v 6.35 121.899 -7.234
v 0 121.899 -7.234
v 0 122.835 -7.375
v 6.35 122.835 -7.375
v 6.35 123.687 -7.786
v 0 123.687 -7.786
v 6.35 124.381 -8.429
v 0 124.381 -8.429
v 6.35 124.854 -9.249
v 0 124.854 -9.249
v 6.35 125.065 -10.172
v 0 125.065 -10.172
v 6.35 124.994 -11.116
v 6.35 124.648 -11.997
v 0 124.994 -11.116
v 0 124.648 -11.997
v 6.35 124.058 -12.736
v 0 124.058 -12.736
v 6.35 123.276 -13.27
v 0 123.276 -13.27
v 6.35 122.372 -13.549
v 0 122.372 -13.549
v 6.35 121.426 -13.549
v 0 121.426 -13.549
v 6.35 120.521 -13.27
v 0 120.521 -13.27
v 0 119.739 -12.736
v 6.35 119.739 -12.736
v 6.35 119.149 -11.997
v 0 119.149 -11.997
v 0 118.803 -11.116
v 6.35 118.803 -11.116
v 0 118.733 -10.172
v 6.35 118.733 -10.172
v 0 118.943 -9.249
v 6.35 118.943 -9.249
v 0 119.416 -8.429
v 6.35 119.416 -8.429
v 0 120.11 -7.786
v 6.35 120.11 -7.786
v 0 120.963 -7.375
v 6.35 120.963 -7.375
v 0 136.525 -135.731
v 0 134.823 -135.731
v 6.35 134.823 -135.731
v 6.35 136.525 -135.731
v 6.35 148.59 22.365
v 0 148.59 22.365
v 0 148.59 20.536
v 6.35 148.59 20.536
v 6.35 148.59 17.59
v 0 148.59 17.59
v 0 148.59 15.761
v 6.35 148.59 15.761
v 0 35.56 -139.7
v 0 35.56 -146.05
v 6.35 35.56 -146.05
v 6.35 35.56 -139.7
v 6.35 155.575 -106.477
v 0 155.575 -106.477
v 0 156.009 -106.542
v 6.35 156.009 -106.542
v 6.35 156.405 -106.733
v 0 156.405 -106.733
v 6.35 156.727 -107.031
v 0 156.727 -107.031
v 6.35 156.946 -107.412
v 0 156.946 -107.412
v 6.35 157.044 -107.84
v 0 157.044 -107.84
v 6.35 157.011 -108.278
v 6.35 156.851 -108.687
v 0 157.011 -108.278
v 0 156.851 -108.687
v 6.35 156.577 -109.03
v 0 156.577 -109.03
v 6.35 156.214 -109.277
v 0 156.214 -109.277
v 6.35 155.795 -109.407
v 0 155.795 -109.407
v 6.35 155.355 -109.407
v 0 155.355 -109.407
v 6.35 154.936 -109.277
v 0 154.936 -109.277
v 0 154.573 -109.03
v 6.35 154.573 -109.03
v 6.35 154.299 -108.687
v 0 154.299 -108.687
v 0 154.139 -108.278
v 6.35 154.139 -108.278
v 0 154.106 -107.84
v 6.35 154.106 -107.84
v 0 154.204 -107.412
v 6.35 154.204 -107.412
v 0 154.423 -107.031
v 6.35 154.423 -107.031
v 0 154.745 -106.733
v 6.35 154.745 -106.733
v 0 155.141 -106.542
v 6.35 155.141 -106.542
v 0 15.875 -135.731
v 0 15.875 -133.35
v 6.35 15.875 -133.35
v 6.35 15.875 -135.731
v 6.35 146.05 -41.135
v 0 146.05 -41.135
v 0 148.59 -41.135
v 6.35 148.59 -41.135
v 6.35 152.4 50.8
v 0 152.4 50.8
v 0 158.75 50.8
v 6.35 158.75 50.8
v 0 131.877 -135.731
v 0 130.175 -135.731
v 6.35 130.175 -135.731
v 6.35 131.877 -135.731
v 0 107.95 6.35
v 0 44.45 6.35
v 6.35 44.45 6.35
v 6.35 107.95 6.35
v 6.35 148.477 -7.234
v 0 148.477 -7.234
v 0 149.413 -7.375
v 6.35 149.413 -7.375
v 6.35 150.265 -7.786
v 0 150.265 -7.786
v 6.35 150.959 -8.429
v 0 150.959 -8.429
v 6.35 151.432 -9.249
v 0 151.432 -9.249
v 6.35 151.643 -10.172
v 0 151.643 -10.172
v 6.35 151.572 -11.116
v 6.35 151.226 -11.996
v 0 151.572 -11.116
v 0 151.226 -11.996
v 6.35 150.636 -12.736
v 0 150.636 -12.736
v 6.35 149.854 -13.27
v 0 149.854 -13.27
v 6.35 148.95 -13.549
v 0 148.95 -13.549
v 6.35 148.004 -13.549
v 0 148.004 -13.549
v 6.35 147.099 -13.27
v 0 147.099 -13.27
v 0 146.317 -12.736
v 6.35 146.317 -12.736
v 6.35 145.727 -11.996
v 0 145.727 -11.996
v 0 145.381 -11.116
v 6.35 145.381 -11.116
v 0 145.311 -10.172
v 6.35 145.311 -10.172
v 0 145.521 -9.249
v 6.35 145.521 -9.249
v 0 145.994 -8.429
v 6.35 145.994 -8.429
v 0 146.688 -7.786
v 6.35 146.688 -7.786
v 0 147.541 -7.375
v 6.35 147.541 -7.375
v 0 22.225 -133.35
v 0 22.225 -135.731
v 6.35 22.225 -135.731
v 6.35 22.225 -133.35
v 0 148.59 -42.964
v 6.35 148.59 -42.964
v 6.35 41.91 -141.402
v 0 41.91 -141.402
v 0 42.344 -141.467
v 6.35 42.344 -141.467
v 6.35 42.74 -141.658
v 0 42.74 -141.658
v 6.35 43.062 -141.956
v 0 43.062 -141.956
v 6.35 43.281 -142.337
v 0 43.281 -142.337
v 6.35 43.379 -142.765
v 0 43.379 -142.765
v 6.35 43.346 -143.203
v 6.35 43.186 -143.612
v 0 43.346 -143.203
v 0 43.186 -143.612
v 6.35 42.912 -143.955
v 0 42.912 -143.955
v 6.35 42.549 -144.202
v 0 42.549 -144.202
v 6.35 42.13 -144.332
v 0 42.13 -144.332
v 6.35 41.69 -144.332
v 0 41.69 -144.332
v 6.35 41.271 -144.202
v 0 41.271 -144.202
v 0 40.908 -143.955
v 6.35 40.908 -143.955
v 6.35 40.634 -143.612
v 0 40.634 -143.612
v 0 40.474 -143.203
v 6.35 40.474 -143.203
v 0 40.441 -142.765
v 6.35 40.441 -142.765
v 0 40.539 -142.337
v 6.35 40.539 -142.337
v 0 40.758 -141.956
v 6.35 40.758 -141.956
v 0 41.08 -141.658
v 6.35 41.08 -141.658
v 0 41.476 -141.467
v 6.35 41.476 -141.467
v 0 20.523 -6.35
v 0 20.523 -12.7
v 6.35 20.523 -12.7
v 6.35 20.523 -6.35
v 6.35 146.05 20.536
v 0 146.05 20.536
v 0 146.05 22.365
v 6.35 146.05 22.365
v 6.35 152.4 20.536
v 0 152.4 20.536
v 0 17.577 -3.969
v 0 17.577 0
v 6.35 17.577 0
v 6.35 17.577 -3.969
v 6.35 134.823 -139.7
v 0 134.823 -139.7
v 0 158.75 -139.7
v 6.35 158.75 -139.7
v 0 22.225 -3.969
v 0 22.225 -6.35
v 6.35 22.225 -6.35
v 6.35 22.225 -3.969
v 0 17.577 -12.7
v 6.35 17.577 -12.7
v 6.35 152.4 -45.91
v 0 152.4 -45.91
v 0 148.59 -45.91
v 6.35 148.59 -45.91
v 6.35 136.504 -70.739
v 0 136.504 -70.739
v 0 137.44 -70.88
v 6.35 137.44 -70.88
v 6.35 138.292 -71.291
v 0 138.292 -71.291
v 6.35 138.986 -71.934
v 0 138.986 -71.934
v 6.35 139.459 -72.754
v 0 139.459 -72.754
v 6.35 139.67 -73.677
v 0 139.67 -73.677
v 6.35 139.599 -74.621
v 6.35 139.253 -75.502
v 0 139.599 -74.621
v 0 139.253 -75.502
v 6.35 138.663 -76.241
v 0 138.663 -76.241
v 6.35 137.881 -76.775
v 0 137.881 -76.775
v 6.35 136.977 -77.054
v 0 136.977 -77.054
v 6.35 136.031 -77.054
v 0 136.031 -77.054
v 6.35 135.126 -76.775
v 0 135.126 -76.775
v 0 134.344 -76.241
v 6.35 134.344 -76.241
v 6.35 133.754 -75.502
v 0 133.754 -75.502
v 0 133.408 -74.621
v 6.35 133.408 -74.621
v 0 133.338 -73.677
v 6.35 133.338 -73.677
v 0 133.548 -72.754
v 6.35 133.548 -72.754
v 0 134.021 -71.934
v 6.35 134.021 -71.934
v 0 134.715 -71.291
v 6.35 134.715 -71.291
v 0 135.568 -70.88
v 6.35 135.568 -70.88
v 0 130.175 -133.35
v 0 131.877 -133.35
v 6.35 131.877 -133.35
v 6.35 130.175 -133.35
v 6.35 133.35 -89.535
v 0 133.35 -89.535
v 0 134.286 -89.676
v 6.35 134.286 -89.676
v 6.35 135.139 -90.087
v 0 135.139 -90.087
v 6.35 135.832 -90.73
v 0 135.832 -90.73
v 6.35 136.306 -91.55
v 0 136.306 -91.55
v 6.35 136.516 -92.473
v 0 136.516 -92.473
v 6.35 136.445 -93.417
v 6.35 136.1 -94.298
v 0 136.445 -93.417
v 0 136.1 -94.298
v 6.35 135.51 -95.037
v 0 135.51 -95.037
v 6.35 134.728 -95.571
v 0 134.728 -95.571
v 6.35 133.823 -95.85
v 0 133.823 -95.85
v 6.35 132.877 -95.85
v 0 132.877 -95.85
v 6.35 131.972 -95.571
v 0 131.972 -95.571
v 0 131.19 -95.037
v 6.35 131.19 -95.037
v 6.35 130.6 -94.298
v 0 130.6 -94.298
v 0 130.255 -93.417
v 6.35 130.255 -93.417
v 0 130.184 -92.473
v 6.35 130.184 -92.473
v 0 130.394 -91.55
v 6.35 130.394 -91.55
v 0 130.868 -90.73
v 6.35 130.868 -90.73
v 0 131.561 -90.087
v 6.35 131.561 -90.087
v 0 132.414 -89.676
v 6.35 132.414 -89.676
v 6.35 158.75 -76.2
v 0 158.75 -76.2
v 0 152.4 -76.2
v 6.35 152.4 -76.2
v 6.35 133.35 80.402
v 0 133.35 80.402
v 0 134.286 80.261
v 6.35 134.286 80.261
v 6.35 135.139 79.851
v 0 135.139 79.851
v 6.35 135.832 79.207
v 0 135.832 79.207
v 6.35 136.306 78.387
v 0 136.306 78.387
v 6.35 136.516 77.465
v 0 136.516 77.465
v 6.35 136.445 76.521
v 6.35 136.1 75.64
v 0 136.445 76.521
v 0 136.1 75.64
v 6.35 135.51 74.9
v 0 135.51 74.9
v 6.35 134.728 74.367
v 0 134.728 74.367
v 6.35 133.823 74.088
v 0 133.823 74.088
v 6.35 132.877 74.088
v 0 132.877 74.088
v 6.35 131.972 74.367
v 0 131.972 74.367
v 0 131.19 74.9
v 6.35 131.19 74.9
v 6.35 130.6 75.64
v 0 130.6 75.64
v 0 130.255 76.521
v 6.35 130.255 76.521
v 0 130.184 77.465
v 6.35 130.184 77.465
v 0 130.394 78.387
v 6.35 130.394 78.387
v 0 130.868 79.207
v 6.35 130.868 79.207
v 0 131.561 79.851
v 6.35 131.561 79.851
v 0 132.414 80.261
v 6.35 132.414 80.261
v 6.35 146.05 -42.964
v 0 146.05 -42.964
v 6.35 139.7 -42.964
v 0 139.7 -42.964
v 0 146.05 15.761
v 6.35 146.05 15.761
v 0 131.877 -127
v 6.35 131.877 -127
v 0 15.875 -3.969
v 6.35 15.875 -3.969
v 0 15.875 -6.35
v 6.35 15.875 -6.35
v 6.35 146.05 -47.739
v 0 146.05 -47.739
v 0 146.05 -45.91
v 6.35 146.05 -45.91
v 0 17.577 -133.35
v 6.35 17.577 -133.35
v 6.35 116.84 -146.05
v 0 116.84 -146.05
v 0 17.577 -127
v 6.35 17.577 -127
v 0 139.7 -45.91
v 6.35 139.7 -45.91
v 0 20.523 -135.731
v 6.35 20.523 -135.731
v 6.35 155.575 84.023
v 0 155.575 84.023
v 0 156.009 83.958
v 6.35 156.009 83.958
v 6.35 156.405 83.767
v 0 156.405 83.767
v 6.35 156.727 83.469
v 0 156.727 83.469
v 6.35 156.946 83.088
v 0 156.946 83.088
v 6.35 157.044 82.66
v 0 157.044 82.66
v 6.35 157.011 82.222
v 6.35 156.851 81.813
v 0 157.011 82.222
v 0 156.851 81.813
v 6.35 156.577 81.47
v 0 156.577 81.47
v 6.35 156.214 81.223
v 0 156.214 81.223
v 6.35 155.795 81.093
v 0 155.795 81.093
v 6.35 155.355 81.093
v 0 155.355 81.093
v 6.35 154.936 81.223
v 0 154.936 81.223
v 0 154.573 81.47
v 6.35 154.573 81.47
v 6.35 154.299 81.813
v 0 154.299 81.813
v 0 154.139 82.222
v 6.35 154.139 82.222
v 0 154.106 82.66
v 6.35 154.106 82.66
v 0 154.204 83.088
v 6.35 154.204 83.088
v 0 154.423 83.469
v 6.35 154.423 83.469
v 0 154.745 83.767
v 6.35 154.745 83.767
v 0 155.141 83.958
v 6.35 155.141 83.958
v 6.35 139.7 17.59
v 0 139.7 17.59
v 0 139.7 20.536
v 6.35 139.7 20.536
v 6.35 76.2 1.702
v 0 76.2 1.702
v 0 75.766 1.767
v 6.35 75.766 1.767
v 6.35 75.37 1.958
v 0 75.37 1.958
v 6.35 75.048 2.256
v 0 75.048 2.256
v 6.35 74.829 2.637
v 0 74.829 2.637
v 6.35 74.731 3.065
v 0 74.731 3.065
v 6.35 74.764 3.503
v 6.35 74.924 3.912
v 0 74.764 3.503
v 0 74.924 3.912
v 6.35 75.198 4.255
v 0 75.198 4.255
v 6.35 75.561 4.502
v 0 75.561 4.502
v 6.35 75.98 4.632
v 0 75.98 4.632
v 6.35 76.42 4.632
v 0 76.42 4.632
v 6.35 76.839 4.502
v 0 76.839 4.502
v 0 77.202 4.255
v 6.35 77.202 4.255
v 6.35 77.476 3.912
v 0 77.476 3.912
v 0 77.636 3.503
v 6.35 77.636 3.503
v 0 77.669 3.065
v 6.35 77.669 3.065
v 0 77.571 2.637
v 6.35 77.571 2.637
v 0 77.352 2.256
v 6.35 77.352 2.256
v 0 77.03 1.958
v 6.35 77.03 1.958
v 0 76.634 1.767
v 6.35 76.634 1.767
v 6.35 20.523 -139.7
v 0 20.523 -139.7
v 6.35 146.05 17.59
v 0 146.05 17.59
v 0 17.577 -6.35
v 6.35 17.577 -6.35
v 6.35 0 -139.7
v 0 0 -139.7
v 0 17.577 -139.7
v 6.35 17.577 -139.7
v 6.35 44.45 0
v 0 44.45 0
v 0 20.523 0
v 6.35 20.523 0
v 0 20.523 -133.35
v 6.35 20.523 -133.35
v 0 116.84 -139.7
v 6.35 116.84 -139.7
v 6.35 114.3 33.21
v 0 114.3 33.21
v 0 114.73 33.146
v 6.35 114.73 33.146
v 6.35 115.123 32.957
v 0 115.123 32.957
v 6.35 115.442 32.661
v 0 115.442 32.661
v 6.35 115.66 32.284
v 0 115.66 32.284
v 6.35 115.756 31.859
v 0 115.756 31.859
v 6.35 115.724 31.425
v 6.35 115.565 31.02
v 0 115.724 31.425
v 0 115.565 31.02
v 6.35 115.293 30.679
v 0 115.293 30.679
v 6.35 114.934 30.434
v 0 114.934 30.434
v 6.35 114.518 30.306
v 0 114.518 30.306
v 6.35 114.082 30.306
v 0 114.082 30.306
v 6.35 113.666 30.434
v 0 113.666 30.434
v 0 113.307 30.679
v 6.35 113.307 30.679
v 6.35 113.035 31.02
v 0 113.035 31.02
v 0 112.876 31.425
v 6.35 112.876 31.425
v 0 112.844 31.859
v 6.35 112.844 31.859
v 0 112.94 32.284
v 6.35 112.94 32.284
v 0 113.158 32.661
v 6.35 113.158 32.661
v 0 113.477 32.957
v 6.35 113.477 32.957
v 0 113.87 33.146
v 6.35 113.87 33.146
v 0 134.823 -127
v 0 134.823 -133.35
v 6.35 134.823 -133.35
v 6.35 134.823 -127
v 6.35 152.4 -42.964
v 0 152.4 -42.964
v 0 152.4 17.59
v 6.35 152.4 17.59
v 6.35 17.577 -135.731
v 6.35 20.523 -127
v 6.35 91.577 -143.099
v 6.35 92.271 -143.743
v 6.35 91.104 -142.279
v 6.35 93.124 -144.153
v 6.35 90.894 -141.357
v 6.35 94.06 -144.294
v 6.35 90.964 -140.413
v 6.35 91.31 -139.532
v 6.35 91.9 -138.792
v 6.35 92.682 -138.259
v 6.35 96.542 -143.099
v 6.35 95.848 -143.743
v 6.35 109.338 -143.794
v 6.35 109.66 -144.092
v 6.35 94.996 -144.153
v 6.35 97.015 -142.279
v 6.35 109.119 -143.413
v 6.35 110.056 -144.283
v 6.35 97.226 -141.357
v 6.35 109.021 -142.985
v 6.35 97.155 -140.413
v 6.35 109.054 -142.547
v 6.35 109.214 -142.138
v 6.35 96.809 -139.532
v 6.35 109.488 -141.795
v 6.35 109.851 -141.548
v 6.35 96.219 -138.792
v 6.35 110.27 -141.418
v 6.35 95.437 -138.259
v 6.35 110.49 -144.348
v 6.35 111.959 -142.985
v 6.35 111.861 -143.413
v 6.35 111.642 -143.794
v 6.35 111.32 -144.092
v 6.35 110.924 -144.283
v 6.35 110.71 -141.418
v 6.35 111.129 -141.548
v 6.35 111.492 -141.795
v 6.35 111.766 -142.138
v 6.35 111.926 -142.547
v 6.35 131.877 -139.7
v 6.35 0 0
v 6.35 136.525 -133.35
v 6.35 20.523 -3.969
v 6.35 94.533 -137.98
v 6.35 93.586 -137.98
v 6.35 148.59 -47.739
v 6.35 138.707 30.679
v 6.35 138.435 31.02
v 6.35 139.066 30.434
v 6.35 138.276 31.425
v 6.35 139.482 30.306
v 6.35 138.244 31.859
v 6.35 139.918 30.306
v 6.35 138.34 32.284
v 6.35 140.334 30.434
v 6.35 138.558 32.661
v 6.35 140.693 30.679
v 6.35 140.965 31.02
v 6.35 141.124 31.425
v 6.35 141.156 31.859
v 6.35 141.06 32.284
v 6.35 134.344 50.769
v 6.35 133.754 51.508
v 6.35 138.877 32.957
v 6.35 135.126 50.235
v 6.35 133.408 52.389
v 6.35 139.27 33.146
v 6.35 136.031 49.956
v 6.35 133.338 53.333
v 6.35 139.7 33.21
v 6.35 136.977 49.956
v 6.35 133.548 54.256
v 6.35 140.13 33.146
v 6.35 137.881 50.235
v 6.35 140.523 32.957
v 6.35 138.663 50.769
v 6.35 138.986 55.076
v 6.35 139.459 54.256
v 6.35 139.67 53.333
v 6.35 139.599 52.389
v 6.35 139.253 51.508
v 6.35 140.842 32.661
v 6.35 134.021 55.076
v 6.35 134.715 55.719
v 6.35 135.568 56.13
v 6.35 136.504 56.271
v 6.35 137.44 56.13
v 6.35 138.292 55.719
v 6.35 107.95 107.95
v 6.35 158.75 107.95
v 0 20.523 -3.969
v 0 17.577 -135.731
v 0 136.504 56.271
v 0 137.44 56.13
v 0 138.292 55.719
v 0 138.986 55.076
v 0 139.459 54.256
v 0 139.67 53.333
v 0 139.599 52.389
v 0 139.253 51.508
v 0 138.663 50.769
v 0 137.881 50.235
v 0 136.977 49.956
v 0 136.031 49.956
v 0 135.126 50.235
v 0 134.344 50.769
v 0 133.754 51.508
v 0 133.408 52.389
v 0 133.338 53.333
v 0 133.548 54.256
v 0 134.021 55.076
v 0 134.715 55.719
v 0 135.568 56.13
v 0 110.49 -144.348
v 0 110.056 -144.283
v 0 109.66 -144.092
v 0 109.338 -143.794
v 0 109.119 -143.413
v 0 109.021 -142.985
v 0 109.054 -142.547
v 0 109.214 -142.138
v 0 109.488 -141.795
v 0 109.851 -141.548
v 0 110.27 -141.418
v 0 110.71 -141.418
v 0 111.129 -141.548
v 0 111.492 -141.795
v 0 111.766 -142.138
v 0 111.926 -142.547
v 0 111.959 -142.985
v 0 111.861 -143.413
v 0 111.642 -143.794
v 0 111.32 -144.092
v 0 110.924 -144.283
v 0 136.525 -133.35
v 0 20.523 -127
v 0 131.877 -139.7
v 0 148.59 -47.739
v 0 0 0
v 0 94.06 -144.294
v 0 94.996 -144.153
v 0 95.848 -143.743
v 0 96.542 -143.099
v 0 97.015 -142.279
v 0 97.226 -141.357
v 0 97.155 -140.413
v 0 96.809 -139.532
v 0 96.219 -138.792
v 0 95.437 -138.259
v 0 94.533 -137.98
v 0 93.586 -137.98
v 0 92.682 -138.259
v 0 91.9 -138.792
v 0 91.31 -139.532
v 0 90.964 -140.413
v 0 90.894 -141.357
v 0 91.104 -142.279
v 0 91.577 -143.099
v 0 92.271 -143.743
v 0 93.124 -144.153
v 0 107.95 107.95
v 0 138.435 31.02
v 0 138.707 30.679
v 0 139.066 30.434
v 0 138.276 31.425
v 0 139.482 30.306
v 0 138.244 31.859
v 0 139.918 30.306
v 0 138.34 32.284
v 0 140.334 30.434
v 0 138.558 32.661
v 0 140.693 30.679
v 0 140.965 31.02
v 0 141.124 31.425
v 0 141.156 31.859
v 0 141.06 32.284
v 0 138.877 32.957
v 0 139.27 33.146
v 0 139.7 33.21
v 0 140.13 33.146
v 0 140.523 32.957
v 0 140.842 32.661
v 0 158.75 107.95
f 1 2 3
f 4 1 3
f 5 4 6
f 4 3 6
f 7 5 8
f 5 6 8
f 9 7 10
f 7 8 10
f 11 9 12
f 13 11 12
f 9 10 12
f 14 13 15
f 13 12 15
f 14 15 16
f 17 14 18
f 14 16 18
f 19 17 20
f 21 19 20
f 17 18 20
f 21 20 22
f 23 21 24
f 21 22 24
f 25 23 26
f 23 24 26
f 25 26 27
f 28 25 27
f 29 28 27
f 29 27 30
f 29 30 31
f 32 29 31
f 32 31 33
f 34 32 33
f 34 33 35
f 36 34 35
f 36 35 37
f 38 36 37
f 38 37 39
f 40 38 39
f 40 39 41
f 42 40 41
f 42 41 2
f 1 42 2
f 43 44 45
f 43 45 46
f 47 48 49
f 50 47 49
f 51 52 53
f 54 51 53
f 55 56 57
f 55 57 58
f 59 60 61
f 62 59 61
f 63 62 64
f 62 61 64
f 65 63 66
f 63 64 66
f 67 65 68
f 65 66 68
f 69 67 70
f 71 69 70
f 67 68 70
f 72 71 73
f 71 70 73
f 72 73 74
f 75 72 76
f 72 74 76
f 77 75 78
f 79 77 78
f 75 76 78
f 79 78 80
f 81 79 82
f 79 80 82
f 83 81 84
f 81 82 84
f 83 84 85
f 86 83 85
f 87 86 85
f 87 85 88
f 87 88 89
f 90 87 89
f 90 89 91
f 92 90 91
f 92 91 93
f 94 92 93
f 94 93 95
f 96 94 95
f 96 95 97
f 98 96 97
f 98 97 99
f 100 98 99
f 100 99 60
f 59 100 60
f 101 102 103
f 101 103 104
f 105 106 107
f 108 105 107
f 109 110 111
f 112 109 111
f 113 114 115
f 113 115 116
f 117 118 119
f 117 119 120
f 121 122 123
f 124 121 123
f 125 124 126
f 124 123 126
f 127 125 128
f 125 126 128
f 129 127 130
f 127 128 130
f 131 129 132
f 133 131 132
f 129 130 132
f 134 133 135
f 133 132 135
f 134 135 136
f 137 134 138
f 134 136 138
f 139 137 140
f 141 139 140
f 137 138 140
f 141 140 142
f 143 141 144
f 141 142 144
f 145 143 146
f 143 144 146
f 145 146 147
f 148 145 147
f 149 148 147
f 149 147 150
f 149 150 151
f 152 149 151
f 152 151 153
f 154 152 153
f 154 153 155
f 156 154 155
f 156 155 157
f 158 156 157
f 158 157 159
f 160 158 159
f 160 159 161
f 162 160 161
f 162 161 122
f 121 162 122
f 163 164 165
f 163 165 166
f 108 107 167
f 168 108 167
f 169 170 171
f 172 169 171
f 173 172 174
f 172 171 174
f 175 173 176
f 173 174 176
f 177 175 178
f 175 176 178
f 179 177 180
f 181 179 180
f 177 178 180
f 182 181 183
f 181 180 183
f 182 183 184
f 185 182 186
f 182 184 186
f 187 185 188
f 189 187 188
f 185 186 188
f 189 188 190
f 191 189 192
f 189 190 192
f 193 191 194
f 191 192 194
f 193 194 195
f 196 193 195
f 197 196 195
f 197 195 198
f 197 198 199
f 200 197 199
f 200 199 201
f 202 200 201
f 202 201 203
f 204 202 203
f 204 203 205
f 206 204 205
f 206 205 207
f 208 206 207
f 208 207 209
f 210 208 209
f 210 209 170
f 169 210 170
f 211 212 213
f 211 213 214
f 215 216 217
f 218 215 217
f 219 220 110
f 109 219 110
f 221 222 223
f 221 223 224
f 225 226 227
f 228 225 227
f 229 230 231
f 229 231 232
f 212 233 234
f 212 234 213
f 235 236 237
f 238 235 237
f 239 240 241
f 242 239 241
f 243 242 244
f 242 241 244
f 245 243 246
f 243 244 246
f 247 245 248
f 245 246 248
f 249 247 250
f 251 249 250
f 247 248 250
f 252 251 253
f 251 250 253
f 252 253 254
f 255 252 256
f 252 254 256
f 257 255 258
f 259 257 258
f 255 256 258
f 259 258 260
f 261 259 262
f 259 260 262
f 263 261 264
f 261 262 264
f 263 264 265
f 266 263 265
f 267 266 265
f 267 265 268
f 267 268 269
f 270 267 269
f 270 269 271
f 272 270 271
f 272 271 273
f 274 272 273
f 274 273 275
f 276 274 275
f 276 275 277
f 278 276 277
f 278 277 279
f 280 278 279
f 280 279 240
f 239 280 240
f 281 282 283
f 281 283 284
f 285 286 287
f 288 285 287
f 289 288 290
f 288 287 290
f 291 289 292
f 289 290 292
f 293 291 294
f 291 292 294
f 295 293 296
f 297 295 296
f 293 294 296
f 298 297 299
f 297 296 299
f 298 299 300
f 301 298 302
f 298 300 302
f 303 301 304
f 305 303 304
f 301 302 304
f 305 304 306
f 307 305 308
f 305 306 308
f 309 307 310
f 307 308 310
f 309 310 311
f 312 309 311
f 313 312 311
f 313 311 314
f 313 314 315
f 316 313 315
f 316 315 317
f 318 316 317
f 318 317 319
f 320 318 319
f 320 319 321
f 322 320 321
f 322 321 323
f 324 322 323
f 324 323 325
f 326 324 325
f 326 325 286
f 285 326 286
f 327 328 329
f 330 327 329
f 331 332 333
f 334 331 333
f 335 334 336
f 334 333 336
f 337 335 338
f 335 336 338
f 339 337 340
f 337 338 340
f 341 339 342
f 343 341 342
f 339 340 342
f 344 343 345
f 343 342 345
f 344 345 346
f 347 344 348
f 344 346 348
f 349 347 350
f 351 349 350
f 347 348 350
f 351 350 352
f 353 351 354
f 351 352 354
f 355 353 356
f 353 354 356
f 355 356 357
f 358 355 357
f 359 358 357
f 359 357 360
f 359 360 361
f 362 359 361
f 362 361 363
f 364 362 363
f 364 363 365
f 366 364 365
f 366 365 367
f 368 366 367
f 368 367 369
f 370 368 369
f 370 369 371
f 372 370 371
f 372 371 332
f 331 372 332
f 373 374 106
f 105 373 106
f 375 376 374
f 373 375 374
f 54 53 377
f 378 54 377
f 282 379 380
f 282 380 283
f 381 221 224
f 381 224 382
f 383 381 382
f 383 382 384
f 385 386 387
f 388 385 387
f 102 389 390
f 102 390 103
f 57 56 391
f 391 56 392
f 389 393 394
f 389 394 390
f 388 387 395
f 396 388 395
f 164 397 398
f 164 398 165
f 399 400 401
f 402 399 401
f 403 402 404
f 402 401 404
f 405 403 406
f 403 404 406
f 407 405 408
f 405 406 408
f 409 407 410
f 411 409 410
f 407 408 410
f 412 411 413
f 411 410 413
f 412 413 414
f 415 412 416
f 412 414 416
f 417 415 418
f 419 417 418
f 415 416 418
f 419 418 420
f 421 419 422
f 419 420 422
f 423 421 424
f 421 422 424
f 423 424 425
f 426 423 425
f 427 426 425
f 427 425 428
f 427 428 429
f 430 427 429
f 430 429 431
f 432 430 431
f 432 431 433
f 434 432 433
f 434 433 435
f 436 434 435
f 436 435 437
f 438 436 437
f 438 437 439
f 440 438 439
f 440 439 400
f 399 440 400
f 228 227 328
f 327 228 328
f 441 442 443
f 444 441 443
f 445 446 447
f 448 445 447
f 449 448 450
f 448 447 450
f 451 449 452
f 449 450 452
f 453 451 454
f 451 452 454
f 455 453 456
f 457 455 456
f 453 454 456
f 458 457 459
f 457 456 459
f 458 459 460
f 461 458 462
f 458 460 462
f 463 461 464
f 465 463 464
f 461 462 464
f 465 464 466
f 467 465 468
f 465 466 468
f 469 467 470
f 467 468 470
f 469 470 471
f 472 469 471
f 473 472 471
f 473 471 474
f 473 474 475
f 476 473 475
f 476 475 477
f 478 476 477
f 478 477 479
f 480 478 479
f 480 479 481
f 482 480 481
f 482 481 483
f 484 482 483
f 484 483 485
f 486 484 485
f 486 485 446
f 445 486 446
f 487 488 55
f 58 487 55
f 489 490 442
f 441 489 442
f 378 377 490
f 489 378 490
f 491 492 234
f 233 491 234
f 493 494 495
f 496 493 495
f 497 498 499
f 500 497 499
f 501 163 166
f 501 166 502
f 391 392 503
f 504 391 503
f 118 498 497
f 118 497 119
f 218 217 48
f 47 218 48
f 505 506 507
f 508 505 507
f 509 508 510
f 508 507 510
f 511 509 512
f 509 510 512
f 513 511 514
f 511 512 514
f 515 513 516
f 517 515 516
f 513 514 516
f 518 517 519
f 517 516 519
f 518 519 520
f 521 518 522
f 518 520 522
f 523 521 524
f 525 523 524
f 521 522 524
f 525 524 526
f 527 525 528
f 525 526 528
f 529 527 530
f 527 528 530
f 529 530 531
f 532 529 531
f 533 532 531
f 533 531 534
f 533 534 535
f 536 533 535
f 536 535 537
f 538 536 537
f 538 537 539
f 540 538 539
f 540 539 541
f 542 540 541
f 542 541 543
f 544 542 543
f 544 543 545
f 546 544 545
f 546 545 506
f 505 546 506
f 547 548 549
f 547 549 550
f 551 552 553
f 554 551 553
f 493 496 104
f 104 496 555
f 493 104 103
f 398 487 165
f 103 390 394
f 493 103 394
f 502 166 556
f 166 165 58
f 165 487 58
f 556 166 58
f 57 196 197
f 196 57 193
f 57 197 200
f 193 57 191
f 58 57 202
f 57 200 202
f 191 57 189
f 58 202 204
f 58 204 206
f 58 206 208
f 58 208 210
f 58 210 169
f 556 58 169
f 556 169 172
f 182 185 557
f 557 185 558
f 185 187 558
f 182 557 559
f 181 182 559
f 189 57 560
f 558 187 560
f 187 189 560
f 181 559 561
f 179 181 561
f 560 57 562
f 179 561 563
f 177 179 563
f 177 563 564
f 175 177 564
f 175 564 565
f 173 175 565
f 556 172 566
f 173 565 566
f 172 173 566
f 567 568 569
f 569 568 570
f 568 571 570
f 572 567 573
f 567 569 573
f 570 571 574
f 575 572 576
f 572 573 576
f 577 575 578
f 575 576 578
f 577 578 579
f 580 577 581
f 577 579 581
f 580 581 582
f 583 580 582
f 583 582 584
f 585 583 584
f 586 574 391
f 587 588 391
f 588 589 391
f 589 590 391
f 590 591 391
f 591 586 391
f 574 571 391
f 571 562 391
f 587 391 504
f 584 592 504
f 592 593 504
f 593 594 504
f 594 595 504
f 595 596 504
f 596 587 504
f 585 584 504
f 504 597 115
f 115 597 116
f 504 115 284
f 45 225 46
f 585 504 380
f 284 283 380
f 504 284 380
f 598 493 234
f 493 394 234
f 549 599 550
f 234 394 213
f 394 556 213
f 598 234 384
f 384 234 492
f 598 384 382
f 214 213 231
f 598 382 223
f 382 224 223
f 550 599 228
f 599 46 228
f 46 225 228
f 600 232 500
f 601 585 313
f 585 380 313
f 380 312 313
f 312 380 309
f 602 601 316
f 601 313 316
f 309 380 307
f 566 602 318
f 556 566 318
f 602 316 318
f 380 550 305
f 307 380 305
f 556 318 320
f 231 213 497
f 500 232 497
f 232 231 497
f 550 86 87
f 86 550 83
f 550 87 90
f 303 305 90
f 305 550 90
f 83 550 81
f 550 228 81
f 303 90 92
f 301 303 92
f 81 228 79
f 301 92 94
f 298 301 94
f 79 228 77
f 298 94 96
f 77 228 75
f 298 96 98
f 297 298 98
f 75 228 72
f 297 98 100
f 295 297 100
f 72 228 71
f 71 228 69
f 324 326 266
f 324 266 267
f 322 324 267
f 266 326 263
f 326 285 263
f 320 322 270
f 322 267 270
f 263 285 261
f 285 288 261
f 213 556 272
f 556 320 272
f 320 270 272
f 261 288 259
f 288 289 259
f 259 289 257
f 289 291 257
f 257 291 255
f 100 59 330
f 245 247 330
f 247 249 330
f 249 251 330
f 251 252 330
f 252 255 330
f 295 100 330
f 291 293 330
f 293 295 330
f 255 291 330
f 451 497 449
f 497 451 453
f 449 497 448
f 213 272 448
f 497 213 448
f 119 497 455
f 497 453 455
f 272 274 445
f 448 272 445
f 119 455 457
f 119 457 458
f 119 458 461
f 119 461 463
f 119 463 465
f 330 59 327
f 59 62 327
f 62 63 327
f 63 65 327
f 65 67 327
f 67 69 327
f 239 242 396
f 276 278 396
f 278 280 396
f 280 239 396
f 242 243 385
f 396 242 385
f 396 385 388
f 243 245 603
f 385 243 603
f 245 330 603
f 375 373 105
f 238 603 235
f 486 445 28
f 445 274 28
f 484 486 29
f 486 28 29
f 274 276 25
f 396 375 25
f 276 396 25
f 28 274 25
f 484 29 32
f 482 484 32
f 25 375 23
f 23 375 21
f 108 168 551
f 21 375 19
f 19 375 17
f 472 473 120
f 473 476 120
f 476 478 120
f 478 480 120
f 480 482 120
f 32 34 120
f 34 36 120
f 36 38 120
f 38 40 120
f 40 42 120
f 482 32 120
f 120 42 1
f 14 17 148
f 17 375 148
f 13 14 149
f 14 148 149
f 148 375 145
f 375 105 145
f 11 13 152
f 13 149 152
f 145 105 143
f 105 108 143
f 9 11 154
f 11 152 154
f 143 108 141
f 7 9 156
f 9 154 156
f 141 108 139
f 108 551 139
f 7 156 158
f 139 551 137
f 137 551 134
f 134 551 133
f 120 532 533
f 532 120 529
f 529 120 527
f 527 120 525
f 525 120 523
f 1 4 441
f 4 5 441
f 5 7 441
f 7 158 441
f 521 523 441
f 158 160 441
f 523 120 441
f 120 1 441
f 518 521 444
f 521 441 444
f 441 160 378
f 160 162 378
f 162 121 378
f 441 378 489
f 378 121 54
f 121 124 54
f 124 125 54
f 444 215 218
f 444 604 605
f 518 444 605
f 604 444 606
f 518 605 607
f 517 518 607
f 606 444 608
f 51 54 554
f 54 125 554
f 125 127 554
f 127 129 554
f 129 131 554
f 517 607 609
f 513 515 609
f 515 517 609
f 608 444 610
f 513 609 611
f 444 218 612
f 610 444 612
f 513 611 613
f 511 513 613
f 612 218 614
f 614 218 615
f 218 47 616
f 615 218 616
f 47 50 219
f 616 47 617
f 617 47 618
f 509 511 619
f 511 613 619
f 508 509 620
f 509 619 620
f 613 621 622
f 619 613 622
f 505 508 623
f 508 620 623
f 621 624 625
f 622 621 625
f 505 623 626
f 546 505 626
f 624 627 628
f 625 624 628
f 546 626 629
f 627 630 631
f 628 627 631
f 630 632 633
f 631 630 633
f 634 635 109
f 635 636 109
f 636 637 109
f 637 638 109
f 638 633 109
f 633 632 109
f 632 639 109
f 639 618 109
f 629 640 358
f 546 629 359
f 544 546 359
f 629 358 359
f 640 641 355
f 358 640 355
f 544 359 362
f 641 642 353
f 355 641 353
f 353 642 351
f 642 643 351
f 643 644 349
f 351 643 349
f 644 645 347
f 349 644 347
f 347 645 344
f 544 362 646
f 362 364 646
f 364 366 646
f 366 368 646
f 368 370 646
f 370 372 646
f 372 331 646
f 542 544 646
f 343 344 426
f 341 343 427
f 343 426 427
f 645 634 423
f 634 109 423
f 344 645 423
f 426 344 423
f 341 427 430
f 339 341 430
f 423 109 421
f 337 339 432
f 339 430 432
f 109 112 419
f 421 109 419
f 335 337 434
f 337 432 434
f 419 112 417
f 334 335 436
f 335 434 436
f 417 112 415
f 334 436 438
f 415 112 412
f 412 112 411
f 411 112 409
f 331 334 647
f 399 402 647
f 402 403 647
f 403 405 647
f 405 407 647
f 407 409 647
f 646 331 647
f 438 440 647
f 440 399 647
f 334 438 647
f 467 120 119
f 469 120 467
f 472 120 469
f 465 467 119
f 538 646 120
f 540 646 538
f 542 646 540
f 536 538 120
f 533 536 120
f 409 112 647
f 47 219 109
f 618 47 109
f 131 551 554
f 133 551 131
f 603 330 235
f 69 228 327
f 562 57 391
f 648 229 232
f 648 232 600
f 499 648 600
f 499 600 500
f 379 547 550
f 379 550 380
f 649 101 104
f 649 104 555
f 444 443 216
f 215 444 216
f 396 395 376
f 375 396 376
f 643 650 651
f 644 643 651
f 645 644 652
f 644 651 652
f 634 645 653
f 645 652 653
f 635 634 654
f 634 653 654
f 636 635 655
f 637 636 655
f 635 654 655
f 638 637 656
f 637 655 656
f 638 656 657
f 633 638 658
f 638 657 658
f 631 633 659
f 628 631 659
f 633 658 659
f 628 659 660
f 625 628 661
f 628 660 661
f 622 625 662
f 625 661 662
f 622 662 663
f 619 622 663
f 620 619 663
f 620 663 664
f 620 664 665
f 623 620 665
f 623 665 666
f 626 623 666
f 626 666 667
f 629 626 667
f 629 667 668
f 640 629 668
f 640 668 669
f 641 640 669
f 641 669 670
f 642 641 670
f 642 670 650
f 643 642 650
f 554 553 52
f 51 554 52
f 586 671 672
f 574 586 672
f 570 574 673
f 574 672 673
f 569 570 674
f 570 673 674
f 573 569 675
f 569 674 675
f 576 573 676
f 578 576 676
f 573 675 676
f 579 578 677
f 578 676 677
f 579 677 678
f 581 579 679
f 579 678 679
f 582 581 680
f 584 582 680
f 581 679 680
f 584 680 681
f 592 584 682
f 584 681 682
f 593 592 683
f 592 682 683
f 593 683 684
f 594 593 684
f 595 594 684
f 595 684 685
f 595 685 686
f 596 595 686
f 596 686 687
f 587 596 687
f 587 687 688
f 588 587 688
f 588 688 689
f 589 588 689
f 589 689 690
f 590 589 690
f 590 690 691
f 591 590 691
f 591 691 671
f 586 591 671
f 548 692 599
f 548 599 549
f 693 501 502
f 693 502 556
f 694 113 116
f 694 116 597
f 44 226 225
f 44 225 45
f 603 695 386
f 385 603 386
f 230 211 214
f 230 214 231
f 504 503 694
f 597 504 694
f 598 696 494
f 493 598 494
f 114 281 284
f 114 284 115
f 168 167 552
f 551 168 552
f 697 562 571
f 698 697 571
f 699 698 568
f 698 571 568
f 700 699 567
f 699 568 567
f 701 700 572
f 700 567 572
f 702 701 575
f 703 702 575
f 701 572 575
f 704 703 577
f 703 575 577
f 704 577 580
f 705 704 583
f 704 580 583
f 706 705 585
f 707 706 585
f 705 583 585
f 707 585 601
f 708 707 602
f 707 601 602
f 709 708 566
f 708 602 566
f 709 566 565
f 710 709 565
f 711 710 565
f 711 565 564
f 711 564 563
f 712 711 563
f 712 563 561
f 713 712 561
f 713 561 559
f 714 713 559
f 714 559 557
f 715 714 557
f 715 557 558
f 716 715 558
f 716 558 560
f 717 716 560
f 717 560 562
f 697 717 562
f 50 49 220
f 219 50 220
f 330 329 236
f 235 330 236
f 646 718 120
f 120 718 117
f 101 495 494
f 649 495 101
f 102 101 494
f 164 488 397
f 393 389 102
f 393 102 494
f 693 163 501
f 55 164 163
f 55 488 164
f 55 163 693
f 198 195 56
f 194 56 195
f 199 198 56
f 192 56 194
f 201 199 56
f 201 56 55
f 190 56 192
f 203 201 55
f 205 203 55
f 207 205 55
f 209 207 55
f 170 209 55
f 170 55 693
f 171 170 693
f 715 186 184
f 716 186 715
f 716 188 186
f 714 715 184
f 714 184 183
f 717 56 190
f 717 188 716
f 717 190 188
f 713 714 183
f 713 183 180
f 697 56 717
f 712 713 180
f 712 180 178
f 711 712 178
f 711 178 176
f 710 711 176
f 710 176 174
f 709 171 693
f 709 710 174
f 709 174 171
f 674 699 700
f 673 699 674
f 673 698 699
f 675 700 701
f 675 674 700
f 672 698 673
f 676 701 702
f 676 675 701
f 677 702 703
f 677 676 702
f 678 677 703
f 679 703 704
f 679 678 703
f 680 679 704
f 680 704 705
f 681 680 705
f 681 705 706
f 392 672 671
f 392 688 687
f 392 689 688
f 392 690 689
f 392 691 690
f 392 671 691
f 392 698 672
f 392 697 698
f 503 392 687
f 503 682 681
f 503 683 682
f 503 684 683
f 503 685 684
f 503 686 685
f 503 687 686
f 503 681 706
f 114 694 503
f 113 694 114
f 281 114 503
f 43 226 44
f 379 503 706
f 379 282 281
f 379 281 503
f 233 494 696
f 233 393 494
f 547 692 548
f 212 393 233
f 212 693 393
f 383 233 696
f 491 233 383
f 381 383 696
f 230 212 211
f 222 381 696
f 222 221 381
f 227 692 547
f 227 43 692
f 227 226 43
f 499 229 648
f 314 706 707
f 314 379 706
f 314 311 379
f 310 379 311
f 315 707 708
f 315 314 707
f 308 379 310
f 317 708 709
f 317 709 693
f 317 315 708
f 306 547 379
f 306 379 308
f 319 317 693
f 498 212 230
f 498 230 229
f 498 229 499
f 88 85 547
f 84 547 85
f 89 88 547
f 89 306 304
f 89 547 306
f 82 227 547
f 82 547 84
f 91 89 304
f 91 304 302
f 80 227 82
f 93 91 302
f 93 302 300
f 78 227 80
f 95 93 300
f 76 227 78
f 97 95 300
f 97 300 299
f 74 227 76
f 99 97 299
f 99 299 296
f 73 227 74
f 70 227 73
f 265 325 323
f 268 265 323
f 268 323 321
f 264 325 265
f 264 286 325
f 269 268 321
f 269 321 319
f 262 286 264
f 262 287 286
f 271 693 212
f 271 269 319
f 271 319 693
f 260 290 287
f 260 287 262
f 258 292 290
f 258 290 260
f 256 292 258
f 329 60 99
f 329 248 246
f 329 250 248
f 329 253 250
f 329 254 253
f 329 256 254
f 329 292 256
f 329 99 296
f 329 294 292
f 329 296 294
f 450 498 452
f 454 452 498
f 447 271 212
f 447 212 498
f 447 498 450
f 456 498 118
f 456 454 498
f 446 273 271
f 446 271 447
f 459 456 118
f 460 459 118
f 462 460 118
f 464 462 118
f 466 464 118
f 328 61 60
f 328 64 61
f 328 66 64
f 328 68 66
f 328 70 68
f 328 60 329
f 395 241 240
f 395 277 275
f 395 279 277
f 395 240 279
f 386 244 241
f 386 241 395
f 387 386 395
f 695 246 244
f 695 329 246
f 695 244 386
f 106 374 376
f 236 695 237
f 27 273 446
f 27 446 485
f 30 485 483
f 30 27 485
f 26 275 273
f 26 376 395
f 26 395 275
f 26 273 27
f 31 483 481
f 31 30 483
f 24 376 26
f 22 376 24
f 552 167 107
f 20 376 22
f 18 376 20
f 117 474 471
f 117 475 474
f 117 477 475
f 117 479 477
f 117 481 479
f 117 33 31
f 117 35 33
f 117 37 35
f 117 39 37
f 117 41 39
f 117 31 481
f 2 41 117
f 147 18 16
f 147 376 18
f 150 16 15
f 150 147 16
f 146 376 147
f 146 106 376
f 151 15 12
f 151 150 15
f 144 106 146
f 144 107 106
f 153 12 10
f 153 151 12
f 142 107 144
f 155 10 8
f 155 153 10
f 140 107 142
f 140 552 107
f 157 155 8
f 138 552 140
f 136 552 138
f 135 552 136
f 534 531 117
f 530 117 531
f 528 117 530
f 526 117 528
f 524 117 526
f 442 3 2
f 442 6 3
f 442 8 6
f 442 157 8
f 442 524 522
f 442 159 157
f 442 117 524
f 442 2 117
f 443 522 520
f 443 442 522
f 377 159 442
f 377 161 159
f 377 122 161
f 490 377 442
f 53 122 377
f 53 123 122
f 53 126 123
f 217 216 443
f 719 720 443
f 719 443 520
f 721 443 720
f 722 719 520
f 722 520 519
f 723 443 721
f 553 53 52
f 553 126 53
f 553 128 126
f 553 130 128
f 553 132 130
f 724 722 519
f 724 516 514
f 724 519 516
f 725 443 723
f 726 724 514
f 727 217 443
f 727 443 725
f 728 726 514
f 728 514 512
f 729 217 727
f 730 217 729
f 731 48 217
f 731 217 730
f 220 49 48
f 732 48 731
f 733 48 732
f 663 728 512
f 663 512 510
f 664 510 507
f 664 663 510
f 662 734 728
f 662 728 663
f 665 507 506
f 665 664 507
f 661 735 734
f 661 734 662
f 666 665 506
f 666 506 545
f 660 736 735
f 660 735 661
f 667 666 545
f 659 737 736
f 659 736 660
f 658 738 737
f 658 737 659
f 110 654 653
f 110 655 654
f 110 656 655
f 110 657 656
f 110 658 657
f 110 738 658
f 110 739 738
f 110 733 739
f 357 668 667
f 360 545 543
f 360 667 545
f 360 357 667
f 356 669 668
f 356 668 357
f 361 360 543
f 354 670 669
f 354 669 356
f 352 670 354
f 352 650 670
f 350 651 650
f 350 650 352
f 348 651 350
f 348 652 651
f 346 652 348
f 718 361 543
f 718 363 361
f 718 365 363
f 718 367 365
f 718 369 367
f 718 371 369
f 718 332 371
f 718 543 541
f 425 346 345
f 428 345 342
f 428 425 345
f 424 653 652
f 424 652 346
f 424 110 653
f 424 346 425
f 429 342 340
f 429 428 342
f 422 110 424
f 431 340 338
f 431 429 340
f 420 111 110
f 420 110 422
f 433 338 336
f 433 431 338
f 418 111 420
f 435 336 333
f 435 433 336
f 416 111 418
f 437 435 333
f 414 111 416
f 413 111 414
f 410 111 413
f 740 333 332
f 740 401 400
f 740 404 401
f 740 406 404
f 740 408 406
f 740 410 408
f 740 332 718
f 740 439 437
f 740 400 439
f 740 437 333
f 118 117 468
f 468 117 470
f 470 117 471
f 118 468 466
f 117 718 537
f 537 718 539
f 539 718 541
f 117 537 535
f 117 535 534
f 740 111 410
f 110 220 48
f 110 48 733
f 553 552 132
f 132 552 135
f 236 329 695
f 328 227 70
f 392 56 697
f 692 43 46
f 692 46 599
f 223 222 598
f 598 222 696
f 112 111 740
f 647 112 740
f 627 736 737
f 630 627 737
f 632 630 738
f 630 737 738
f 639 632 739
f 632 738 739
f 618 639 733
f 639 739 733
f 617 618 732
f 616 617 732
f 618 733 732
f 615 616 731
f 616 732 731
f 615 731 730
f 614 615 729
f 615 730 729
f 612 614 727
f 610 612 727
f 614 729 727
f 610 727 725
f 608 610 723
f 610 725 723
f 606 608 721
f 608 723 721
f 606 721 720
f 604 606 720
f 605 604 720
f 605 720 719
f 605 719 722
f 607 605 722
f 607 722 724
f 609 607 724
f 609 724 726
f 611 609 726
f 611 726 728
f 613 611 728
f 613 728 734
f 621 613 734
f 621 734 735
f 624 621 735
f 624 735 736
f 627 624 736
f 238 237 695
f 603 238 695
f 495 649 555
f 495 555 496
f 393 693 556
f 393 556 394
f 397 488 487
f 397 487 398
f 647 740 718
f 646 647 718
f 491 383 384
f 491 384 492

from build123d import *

# Parameters (mm, degrees)
BOSS_EXTRUDE1_DEPTH = 6.35
CUT_EXTRUDE1_DEPTH  = 212.560806862
SKETCH4_W           = 6.35
SKETCH4_H           = 63.5
SKETCH4_H_2         = 81.28
BOSS_EXTRUDE3_DEPTH = 6.35
SKETCH5_R           = 1.4732
CUT_EXTRUDE2_DEPTH  = 216.806597443
SKETCH6_R           = 3.175
SKETCH6_R_2         = 1.4732
CUT_EXTRUDE3_DEPTH  = 216.806597443
CUT_EXTRUDE4_REACH  = 217.807
SKETCH7_R           = 3.175
SKETCH8_R           = 1.4605
CUT_EXTRUDE5_DEPTH  = 216.806597443


with BuildPart() as part:
    # Sketch1 → Boss-Extrude1 (new body)
    with BuildSketch(Plane(origin=(0, 0, 0), x_dir=(0, 0, -1), z_dir=(1, 0, 0))):
        Polygon((0, 0), (139.7, 0), (139.7, 158.75), (76.2, 158.75), (76.2, 152.4), (0, 152.4), (-50.8, 152.4), (-50.8, 158.75), (-107.95, 158.75), (-107.95, 107.95), (0, 107.95), align=None)
    extrude(amount=BOSS_EXTRUDE1_DEPTH)

    # Sketch2 → Cut-Extrude1 (cut, through all)
    with BuildSketch(Plane.ZY):
        Polygon((0, 17.5768), (-3.96875, 17.5768), (-3.96875, 15.875), (-6.35, 15.875), (-6.35, 17.5768), (-12.7, 17.5768), (-12.7, 20.5232), (-6.35, 20.5232), (-6.35, 22.225), (-3.96875, 22.225), (-3.96875, 20.5232), (0, 20.5232), align=None)
        Polygon((-139.7, 17.5768), (-139.7, 20.5232), (-135.73125, 20.5232), (-135.73125, 22.225), (-133.35, 22.225), (-133.35, 20.5232), (-127, 20.5232), (-127, 17.5768), (-133.35, 17.5768), (-133.35, 15.875), (-135.73125, 15.875), (-135.73125, 17.5768), align=None)
        Polygon((-133.35, 136.525), (-133.35, 134.8232), (-127, 134.8232), (-127, 131.8768), (-133.35, 131.8768), (-133.35, 130.175), (-135.73125, 130.175), (-135.73125, 131.8768), (-139.7, 131.8768), (-139.7, 134.8232), (-135.73125, 134.8232), (-135.73125, 136.525), align=None)
    extrude(amount=-CUT_EXTRUDE1_DEPTH, mode=Mode.SUBTRACT)

    # Sketch4 → Boss-Extrude3 (add)
    with BuildSketch(Plane.ZY):
        with Locations((3.175, 76.2)):
            Rectangle(SKETCH4_W, SKETCH4_H)
        with Locations((-142.875, 76.2)):
            Rectangle(SKETCH4_W, SKETCH4_H_2)
    extrude(amount=-BOSS_EXTRUDE3_DEPTH)

    # Sketch5 → Cut-Extrude2 (cut, through all)
    with BuildSketch(Plane.ZY):
        with Locations(Location((3.175, 76.2, 0), (0, 0, 180))):
            Circle(SKETCH5_R)
        with Locations((-142.875, 41.91)):
            Circle(SKETCH5_R)
        with Locations(Location((-142.875, 110.49, 0), (0, 0, 180))):
            Circle(SKETCH5_R)
    extrude(amount=-CUT_EXTRUDE2_DEPTH, mode=Mode.SUBTRACT)

    # Sketch6 → Cut-Extrude3 (cut, through all)
    with BuildSketch(Plane.ZY):
        with Locations((-92.71, 133.35)):
            Circle(SKETCH6_R)
        with Locations((-107.95, 155.575)):
            Circle(SKETCH6_R_2)
        with Locations((-73.914, 136.503809764)):
            Circle(SKETCH6_R)
        with Locations((82.55, 155.575)):
            Circle(SKETCH6_R_2)
        with Locations((77.227381395, 133.35)):
            Circle(SKETCH6_R)
        with Locations((53.096, 136.503809756)):
            Circle(SKETCH6_R)
        with Locations((-10.409000001, 121.89880976)):
            Circle(SKETCH6_R)
        with Locations((-10.408999999, 148.476804796)):
            Circle(SKETCH6_R)
        Polygon((-42.9641, 152.4), (-45.9105, 152.4), (-45.9105, 148.59), (-47.7393, 148.59), (-47.7393, 146.05), (-45.9105, 146.05), (-45.9105, 139.7), (-42.9641, 139.7), (-42.9641, 146.05), (-41.1353, 146.05), (-41.1353, 148.59), (-42.9641, 148.59), align=None)
        Polygon((20.5359, 152.4), (17.5895, 152.4), (17.5895, 148.59), (15.7607, 148.59), (15.7607, 146.05), (17.5895, 146.05), (17.5895, 139.7), (20.5359, 139.7), (20.5359, 146.05), (22.3647, 146.05), (22.3647, 148.59), (20.5359, 148.59), align=None)
    extrude(amount=-CUT_EXTRUDE3_DEPTH, mode=Mode.SUBTRACT)

    # Sketch7 → Cut-Extrude4 (cut, up to next)
    with BuildSketch(Plane(origin=(6.35, 0, 0), x_dir=(0, 0, -1), z_dir=(1, 0, 0)), mode=Mode.PRIVATE) as cut_extrude4_sk1:
        with Locations((141.119403898, 94.059701015)):
            Circle(SKETCH7_R)
    cut_extrude4_tool1 = extrude(cut_extrude4_sk1.sketch, amount=-CUT_EXTRUDE4_REACH, mode=Mode.PRIVATE) & part.part
    add(cut_extrude4_tool1.solids().sort_by_distance((6.35, 94.059701, -141.119404))[0], mode=Mode.SUBTRACT)

    # Sketch8 → Cut-Extrude5 (cut, through all)
    with BuildSketch(Plane.ZY):
        with Locations((31.75, 114.3)):
            Circle(SKETCH8_R)
        with Locations((31.75, 139.7)):
            Circle(SKETCH8_R)
    extrude(amount=-CUT_EXTRUDE5_DEPTH, mode=Mode.SUBTRACT)


solid = part.part
